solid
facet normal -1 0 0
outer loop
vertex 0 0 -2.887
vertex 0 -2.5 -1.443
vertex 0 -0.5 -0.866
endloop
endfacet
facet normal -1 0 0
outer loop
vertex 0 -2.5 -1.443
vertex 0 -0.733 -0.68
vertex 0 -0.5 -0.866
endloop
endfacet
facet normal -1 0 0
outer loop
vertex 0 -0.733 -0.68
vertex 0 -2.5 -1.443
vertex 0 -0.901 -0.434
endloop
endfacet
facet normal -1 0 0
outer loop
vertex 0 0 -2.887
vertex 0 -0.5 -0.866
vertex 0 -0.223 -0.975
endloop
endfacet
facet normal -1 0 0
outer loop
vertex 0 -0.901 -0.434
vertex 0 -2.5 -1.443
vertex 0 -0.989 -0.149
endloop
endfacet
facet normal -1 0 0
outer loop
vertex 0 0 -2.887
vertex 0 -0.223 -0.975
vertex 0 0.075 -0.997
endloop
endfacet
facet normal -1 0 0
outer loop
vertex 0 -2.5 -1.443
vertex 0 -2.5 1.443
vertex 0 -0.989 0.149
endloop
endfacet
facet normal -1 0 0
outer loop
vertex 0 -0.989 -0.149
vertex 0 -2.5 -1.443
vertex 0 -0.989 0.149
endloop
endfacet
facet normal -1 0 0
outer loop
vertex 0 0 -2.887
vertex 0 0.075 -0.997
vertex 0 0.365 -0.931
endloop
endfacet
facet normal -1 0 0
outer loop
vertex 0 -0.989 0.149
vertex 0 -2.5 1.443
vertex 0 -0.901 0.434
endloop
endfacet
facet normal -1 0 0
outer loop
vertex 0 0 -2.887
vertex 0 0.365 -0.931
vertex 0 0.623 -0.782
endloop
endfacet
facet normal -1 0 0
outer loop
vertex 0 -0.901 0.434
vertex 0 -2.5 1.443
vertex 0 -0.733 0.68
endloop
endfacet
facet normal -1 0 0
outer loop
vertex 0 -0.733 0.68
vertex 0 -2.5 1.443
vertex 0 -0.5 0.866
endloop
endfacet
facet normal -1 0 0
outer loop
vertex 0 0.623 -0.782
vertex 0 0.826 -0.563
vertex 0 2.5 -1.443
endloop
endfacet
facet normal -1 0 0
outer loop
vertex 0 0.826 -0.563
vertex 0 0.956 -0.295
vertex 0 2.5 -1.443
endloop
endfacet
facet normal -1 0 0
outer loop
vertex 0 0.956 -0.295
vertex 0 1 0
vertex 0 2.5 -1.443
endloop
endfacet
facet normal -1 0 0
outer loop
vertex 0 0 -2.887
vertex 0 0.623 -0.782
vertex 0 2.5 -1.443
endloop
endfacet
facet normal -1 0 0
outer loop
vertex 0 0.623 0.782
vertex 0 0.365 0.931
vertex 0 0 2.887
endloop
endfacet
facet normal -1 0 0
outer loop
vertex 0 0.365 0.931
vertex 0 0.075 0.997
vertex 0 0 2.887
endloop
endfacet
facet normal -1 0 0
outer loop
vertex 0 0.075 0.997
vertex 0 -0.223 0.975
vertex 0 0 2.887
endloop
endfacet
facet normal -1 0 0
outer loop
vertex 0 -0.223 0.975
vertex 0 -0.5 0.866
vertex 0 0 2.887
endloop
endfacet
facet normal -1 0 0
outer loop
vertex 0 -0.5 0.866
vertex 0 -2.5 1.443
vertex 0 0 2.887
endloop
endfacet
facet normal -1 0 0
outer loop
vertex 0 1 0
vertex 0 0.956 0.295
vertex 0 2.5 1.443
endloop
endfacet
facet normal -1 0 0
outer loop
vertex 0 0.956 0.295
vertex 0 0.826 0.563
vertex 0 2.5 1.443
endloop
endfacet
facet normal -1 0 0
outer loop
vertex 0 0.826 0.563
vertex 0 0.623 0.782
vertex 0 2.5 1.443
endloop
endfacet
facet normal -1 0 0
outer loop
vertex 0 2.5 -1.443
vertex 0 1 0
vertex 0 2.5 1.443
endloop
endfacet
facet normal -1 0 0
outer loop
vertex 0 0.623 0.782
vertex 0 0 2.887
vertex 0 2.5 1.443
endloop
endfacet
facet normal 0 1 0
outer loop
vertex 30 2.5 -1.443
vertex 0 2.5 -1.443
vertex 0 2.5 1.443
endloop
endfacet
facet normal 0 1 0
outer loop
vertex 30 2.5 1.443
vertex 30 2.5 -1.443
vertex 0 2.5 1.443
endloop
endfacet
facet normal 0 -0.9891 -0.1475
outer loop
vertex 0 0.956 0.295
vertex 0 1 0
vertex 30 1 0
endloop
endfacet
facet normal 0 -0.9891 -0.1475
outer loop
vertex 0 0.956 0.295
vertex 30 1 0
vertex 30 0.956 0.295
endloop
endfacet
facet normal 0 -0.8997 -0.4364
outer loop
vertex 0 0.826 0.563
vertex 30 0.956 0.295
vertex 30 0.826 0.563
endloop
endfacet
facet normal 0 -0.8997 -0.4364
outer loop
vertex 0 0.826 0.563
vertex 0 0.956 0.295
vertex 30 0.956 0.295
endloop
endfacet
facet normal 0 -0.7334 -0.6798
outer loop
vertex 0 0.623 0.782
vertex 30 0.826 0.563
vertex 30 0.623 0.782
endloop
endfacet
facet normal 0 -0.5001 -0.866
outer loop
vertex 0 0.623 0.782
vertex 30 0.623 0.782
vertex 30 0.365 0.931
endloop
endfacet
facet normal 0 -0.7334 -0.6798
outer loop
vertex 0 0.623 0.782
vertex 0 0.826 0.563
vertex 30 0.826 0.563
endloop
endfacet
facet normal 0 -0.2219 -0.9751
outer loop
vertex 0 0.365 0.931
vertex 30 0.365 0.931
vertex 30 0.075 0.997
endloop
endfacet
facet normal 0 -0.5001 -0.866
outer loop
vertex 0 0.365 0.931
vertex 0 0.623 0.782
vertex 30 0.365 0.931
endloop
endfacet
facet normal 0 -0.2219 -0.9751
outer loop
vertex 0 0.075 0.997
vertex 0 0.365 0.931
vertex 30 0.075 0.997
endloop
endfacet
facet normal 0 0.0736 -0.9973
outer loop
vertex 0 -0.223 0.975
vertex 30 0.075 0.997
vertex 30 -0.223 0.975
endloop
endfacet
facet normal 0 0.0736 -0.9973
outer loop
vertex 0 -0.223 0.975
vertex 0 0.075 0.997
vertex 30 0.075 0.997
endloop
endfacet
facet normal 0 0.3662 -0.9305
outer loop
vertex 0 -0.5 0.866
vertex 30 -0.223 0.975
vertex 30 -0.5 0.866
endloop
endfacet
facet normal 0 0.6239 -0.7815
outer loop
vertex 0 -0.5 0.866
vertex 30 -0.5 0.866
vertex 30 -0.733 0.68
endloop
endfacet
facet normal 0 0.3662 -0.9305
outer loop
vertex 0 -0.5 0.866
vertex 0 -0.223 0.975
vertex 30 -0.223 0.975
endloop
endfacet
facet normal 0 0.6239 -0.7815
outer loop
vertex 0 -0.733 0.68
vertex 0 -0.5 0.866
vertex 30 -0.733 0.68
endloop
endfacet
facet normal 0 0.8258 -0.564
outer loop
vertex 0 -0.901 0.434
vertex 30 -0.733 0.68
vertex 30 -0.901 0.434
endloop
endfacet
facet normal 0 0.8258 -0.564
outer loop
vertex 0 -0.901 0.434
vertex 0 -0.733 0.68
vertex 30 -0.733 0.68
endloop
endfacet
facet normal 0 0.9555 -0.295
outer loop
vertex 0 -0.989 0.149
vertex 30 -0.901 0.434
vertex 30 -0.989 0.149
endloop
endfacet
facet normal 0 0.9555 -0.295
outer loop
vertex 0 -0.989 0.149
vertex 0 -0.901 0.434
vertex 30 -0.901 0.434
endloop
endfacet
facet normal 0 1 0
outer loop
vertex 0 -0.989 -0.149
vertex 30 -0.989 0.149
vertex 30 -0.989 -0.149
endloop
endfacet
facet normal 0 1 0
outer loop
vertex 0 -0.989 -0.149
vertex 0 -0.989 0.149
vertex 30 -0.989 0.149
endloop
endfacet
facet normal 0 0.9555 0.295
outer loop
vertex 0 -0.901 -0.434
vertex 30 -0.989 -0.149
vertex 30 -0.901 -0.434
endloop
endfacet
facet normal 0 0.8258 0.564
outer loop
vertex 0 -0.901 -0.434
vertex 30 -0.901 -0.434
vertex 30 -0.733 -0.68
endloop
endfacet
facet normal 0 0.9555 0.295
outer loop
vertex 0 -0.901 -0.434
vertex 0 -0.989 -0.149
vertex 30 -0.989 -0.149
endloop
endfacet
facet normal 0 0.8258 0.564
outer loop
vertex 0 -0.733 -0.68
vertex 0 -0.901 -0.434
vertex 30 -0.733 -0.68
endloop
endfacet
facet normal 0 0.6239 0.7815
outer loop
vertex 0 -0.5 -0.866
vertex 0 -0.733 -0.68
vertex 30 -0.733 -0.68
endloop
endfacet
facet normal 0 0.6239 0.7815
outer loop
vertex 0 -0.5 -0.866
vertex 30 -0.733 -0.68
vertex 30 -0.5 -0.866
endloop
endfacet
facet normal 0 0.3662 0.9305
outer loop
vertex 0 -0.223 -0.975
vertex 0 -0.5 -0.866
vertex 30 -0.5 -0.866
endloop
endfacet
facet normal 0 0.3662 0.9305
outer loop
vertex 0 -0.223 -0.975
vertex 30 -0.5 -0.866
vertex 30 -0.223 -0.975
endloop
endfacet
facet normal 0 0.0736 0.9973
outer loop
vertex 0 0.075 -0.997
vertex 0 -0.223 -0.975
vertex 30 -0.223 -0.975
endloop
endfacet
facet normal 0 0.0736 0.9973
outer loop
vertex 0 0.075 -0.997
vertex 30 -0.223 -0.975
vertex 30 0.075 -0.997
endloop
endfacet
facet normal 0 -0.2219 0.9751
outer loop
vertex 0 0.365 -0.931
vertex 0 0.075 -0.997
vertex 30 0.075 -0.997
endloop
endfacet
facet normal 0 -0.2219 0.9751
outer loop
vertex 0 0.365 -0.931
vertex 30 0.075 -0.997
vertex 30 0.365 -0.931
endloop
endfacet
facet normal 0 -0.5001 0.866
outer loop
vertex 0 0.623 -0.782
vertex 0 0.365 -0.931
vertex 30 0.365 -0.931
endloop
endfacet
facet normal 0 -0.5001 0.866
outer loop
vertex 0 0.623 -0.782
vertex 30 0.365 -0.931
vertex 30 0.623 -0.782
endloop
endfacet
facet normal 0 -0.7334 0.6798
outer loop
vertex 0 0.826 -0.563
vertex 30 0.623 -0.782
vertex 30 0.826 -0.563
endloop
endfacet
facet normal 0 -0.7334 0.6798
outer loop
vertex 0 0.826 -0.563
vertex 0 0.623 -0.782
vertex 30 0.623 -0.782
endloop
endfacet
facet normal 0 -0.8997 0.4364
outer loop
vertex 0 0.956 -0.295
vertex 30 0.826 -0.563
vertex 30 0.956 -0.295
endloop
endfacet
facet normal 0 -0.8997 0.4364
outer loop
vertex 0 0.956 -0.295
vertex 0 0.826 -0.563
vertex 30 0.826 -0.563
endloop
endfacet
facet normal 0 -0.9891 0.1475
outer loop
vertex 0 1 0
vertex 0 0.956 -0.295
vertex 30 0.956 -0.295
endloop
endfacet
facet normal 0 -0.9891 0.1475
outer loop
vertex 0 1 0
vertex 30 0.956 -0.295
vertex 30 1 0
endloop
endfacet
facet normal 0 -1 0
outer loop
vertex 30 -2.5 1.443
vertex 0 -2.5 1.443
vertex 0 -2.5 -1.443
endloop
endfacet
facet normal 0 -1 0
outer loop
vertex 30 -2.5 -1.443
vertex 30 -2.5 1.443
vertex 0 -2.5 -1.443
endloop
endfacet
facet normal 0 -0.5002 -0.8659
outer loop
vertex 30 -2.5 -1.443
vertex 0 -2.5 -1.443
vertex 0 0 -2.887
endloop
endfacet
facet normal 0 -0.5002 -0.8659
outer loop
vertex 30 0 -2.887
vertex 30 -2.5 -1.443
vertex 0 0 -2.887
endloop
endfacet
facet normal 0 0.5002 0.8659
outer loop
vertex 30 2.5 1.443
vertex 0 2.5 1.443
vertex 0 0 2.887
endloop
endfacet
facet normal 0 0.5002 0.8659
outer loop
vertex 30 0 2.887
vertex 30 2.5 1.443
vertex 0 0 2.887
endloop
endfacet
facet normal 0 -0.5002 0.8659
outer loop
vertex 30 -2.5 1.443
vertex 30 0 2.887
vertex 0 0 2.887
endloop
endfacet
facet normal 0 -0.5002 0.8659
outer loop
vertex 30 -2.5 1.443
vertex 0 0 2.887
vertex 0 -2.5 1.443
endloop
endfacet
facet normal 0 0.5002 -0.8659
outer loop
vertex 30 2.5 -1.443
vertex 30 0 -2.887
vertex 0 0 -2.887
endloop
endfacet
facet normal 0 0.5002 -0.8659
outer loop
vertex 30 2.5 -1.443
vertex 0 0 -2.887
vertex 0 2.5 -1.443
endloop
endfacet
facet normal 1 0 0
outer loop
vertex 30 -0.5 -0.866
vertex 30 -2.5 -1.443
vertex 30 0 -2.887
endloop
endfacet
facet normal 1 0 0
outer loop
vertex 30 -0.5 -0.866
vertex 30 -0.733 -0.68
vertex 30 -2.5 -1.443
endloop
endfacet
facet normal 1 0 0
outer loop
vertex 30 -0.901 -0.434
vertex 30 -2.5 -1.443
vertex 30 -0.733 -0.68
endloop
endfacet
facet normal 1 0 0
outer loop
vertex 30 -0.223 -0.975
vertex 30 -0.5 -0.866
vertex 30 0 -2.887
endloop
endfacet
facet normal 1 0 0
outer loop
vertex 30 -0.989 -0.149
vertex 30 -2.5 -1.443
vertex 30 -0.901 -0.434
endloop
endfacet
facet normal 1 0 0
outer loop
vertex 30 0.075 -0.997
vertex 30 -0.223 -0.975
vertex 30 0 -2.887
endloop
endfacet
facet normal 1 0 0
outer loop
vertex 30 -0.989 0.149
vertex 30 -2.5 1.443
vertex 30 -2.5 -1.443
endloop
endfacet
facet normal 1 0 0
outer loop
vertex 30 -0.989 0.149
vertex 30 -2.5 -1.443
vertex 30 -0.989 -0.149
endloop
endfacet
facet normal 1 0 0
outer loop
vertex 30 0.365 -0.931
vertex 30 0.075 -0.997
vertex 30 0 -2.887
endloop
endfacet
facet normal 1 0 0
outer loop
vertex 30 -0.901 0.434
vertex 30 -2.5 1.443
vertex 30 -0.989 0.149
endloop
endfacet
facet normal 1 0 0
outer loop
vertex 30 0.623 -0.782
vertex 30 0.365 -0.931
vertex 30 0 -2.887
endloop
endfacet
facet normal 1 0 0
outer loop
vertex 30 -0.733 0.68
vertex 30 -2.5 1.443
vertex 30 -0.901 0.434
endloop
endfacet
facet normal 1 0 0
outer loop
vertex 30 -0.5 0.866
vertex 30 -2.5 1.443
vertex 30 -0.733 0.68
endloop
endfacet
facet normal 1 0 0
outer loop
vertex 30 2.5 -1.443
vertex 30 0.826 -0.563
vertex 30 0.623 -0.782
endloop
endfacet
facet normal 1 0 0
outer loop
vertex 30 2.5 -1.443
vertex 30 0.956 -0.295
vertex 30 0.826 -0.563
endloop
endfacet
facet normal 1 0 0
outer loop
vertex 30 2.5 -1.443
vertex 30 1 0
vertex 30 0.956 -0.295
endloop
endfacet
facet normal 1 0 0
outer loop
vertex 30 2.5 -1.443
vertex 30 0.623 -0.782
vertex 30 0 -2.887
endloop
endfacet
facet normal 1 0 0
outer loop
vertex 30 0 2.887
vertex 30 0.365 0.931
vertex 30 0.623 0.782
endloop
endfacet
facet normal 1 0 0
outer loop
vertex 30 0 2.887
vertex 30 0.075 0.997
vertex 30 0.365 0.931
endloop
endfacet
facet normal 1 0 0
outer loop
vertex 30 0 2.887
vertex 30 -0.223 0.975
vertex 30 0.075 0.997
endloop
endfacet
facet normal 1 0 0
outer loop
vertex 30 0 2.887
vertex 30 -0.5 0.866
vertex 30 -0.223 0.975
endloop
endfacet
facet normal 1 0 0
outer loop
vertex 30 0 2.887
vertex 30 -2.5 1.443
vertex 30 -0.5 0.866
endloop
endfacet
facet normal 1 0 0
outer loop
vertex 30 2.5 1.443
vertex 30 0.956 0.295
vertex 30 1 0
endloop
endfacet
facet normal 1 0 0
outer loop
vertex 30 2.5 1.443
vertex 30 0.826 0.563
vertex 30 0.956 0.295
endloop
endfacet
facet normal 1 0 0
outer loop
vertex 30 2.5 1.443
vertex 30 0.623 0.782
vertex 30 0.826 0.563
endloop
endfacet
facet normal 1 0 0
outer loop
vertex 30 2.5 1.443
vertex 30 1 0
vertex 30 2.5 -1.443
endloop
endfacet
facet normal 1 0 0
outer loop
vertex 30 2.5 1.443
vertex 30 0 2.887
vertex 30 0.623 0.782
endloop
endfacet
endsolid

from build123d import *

# Parameters (mm, degrees)
F0_R     = 1
F1_DEPTH = 30


with BuildPart() as f1:
    # F0 (on Right) → F1 (new body)
    with BuildSketch(Plane.YZ):
        Polygon((2.5, -1.443376), (2.5, 1.443376), (0, 2.886751), (-2.5, 1.443376), (-2.5, -1.443376), (0, -2.886751), align=None)
        Circle(F0_R, mode=Mode.SUBTRACT)
    extrude(amount=F1_DEPTH)


solid = f1.part
